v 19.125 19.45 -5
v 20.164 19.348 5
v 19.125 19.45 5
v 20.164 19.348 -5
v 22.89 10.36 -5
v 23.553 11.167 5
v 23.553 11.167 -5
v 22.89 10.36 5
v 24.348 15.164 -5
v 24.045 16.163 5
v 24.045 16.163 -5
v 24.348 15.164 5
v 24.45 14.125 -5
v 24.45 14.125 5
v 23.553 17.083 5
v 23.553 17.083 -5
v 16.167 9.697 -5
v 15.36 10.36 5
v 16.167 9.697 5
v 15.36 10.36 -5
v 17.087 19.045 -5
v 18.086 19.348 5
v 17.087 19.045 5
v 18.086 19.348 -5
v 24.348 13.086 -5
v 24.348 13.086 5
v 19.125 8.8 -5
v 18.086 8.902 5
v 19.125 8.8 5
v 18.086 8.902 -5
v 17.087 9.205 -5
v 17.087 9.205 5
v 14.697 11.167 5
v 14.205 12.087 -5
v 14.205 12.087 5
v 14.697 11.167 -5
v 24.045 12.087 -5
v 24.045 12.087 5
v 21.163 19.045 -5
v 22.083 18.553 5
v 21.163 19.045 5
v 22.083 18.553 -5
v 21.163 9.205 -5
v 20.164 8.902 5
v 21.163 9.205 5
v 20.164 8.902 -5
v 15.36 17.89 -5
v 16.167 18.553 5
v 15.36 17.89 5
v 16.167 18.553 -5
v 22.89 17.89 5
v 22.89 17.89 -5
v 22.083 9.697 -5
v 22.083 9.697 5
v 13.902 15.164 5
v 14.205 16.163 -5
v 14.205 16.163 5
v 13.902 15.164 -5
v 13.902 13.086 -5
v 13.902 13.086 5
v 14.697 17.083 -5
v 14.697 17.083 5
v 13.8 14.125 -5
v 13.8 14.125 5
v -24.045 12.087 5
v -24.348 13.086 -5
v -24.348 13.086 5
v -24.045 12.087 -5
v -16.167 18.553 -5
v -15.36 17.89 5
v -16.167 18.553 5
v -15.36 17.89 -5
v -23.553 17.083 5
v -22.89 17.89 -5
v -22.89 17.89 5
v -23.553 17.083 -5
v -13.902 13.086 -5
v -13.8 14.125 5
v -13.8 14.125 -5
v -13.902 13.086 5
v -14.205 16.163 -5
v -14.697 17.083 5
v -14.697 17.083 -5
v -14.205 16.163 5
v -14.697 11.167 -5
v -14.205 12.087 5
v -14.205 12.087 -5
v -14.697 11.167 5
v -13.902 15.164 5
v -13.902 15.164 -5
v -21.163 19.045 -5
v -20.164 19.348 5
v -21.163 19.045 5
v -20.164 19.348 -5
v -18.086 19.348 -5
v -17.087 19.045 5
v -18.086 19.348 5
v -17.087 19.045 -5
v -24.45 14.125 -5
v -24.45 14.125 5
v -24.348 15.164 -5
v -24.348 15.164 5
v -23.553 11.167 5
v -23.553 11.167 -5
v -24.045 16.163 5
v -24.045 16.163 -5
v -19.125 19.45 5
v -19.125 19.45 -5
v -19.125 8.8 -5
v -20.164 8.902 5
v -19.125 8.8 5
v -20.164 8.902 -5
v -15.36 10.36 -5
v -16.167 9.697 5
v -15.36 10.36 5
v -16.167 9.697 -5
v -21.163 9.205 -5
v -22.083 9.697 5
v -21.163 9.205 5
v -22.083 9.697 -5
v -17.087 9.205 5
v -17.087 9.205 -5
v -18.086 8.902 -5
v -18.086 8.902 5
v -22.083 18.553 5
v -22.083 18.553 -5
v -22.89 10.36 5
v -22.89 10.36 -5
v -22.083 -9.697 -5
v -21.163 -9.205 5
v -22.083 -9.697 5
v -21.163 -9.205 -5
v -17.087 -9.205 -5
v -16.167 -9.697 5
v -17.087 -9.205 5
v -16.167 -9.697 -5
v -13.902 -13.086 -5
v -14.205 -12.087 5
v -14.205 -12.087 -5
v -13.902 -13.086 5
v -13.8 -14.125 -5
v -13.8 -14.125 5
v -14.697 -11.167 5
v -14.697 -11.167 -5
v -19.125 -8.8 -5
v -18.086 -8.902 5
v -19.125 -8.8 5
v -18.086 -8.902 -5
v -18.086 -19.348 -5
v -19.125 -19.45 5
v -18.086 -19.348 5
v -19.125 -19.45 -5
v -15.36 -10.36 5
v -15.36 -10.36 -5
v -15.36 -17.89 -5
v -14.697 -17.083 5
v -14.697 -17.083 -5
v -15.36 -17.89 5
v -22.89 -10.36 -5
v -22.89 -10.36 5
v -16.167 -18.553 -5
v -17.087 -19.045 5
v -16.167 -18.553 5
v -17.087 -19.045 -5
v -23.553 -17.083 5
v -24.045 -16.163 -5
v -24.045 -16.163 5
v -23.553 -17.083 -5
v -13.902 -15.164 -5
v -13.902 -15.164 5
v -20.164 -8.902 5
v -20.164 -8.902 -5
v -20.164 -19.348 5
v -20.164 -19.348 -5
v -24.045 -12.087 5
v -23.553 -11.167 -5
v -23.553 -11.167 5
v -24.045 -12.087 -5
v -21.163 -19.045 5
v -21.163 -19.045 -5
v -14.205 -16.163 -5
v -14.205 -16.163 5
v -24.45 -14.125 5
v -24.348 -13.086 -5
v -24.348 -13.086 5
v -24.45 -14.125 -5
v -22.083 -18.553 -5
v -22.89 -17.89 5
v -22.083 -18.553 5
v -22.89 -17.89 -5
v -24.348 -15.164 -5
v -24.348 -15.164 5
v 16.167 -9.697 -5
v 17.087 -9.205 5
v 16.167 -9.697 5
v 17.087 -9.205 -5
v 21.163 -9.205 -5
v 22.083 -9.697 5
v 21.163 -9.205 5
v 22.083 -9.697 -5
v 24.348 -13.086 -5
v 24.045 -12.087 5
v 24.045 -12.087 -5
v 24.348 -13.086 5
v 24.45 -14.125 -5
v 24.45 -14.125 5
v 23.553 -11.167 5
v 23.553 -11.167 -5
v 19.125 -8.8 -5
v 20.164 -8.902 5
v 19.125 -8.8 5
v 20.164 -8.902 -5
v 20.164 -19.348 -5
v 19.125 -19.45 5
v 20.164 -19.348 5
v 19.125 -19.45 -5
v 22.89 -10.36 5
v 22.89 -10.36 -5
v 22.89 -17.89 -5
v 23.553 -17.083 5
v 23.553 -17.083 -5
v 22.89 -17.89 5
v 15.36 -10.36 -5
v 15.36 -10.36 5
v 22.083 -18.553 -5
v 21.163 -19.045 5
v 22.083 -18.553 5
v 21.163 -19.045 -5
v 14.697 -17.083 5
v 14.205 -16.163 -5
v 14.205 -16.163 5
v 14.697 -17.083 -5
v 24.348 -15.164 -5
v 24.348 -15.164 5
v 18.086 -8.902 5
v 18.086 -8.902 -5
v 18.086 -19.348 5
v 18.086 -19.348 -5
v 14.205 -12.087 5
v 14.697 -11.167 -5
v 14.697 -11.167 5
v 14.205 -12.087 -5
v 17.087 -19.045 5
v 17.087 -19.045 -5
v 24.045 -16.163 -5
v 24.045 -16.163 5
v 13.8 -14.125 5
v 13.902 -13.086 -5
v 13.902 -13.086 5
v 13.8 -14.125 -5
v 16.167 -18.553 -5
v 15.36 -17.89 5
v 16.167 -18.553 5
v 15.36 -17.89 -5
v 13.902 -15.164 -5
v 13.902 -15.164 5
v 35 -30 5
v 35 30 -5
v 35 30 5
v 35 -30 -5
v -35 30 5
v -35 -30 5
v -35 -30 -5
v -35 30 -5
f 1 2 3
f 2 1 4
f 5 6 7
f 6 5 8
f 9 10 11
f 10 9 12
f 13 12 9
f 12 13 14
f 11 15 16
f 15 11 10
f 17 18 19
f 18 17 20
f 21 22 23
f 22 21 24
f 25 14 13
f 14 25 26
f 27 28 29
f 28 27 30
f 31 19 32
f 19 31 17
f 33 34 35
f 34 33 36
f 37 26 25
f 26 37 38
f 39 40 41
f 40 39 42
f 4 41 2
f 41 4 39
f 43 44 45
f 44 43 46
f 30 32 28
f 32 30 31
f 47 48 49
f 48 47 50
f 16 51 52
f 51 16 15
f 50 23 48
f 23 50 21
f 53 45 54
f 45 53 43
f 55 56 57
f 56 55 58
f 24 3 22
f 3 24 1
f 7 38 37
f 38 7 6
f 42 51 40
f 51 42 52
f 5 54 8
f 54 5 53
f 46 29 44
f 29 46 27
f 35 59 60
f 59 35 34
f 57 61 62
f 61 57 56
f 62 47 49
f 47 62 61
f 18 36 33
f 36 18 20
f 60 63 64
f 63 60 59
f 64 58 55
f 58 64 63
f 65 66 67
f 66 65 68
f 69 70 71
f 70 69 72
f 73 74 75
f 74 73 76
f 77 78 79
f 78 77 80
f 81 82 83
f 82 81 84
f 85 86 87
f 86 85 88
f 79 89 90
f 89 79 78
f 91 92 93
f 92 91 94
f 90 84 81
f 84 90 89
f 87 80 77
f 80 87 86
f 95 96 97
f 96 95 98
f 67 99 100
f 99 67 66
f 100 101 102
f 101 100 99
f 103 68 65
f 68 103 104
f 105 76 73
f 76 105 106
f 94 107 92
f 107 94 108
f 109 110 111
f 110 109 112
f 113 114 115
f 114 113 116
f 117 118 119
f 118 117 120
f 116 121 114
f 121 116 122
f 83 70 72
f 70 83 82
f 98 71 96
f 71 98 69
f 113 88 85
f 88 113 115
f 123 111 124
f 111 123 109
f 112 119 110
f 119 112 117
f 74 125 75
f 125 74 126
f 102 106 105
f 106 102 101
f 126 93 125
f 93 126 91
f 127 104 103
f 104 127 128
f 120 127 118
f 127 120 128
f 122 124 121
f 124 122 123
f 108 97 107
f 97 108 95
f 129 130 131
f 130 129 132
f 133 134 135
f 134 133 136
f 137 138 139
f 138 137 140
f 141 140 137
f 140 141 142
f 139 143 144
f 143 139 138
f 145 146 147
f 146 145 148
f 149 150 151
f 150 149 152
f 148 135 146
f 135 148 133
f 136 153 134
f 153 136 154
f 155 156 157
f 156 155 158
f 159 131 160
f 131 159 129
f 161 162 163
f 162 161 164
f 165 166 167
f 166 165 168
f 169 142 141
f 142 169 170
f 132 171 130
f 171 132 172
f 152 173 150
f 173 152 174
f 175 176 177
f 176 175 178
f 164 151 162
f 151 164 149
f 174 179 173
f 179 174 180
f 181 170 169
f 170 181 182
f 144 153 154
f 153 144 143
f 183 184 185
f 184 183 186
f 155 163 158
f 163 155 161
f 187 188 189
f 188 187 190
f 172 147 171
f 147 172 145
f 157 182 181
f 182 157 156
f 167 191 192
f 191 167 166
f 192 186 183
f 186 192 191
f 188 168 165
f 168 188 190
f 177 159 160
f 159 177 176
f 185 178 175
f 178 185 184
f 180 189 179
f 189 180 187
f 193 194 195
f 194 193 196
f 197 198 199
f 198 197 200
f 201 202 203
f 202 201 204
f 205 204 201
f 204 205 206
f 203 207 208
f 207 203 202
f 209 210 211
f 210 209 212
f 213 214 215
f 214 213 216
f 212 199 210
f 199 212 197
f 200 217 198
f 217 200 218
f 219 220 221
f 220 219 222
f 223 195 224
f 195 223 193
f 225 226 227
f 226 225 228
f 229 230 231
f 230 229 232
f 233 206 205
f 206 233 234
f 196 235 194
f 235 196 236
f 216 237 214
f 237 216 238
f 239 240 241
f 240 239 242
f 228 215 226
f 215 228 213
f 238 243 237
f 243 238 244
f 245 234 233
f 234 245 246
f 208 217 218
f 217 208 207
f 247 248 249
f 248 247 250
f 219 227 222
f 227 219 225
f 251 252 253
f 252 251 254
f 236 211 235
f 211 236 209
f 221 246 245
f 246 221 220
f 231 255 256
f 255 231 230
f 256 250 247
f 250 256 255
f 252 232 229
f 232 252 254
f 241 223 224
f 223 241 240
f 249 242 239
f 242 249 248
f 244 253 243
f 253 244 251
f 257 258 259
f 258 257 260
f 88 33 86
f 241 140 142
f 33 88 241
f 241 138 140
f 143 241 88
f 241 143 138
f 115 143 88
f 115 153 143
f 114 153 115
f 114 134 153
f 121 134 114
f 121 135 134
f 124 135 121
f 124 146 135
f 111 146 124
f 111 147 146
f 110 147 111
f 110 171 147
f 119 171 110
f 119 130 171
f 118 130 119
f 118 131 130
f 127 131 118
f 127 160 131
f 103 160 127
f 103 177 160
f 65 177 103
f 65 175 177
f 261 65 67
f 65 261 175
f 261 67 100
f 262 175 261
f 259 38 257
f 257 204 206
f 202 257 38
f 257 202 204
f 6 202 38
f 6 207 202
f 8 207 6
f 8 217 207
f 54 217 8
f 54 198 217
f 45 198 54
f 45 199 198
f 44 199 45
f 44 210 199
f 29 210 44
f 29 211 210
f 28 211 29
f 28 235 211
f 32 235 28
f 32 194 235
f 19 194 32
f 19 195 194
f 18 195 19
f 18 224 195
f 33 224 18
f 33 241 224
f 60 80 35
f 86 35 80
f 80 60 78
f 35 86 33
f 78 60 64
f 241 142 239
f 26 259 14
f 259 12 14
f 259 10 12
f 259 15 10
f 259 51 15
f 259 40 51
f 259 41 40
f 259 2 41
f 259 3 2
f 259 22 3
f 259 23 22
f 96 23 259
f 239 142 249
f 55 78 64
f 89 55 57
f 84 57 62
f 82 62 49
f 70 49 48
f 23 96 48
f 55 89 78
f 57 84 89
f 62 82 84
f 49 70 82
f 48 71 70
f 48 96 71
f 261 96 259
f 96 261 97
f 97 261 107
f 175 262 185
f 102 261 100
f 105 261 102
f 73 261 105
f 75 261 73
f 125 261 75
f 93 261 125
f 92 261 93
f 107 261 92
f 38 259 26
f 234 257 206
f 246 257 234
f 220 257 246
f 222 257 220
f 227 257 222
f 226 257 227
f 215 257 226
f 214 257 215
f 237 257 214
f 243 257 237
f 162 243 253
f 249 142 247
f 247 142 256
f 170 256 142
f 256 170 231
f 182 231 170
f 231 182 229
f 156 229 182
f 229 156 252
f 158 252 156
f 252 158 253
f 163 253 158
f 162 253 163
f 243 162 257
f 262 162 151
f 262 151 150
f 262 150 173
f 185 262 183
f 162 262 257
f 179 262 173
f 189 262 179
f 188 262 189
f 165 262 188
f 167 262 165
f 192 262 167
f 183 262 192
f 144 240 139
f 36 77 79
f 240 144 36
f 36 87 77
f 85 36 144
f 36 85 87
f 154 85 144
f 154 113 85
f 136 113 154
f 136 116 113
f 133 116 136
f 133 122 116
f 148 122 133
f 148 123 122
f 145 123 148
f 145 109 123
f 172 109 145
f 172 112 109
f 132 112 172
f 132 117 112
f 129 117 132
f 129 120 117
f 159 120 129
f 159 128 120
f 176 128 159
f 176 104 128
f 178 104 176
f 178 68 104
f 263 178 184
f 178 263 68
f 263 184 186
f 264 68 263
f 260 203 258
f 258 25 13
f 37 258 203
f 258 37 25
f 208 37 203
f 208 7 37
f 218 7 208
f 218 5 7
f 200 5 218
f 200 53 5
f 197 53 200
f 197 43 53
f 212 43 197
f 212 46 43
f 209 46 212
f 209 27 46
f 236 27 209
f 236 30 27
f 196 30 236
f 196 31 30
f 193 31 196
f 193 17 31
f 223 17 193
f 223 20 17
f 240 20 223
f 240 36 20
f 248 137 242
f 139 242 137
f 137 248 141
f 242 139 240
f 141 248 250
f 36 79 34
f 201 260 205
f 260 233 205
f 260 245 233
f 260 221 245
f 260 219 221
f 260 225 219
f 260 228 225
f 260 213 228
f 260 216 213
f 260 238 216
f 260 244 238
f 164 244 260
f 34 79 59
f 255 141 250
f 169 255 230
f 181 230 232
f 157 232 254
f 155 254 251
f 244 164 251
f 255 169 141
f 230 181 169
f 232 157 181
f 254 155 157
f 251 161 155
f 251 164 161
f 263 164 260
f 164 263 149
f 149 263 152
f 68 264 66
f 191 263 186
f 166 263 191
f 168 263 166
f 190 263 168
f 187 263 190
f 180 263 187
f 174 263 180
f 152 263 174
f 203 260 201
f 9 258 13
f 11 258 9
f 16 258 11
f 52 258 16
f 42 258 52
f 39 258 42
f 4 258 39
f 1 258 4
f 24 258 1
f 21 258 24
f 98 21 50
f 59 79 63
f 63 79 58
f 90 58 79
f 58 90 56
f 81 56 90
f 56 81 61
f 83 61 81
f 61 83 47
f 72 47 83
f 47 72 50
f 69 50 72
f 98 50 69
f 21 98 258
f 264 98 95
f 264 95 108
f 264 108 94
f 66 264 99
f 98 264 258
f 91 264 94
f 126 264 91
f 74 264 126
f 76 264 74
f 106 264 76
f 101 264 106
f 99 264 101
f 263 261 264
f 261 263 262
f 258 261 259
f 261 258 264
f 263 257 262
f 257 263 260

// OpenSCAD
$fn = 32;

// ----------------------------------------------------------------------
// Corner plate 70 x 60 x 10
// 4 holes, centres taken from the edge offset
// ----------------------------------------------------------------------

// --- parameters (mm) ---
plate = [70, 60, 10];    // overall size (x, y, z)
holes = 4;               // number of holes the drawing asks for
bore_d = 10.5;           // nominal hole diameter from the drawing
print_allowance = 0.15;  // clearance added for printing
edge = 15.875;           // hole centre offset from the plate edge

// --- derived feature positions (mm) ---
hole_d = bore_d + print_allowance;  // = 10.65   hole diameter as printed
corner_x = plate[0] / 2 - edge;     // = 19.12   corner hole X
corner_y = plate[1] / 2 - edge;     // = 14.12   corner hole Y
feature_centers = [
  [corner_x, corner_y],
  [-corner_x, corner_y],
  [-corner_x, -corner_y],
  [corner_x, -corner_y]
];   // hole centres the loop below drills

// plate outline, every hole drilled through with the same cutters
difference() {
  cube(plate, center = true);
  for (centre = feature_centers)
    translate([centre[0], centre[1], 0])
      cylinder(d = hole_d, h = plate[2] + 2, center = true);
}
